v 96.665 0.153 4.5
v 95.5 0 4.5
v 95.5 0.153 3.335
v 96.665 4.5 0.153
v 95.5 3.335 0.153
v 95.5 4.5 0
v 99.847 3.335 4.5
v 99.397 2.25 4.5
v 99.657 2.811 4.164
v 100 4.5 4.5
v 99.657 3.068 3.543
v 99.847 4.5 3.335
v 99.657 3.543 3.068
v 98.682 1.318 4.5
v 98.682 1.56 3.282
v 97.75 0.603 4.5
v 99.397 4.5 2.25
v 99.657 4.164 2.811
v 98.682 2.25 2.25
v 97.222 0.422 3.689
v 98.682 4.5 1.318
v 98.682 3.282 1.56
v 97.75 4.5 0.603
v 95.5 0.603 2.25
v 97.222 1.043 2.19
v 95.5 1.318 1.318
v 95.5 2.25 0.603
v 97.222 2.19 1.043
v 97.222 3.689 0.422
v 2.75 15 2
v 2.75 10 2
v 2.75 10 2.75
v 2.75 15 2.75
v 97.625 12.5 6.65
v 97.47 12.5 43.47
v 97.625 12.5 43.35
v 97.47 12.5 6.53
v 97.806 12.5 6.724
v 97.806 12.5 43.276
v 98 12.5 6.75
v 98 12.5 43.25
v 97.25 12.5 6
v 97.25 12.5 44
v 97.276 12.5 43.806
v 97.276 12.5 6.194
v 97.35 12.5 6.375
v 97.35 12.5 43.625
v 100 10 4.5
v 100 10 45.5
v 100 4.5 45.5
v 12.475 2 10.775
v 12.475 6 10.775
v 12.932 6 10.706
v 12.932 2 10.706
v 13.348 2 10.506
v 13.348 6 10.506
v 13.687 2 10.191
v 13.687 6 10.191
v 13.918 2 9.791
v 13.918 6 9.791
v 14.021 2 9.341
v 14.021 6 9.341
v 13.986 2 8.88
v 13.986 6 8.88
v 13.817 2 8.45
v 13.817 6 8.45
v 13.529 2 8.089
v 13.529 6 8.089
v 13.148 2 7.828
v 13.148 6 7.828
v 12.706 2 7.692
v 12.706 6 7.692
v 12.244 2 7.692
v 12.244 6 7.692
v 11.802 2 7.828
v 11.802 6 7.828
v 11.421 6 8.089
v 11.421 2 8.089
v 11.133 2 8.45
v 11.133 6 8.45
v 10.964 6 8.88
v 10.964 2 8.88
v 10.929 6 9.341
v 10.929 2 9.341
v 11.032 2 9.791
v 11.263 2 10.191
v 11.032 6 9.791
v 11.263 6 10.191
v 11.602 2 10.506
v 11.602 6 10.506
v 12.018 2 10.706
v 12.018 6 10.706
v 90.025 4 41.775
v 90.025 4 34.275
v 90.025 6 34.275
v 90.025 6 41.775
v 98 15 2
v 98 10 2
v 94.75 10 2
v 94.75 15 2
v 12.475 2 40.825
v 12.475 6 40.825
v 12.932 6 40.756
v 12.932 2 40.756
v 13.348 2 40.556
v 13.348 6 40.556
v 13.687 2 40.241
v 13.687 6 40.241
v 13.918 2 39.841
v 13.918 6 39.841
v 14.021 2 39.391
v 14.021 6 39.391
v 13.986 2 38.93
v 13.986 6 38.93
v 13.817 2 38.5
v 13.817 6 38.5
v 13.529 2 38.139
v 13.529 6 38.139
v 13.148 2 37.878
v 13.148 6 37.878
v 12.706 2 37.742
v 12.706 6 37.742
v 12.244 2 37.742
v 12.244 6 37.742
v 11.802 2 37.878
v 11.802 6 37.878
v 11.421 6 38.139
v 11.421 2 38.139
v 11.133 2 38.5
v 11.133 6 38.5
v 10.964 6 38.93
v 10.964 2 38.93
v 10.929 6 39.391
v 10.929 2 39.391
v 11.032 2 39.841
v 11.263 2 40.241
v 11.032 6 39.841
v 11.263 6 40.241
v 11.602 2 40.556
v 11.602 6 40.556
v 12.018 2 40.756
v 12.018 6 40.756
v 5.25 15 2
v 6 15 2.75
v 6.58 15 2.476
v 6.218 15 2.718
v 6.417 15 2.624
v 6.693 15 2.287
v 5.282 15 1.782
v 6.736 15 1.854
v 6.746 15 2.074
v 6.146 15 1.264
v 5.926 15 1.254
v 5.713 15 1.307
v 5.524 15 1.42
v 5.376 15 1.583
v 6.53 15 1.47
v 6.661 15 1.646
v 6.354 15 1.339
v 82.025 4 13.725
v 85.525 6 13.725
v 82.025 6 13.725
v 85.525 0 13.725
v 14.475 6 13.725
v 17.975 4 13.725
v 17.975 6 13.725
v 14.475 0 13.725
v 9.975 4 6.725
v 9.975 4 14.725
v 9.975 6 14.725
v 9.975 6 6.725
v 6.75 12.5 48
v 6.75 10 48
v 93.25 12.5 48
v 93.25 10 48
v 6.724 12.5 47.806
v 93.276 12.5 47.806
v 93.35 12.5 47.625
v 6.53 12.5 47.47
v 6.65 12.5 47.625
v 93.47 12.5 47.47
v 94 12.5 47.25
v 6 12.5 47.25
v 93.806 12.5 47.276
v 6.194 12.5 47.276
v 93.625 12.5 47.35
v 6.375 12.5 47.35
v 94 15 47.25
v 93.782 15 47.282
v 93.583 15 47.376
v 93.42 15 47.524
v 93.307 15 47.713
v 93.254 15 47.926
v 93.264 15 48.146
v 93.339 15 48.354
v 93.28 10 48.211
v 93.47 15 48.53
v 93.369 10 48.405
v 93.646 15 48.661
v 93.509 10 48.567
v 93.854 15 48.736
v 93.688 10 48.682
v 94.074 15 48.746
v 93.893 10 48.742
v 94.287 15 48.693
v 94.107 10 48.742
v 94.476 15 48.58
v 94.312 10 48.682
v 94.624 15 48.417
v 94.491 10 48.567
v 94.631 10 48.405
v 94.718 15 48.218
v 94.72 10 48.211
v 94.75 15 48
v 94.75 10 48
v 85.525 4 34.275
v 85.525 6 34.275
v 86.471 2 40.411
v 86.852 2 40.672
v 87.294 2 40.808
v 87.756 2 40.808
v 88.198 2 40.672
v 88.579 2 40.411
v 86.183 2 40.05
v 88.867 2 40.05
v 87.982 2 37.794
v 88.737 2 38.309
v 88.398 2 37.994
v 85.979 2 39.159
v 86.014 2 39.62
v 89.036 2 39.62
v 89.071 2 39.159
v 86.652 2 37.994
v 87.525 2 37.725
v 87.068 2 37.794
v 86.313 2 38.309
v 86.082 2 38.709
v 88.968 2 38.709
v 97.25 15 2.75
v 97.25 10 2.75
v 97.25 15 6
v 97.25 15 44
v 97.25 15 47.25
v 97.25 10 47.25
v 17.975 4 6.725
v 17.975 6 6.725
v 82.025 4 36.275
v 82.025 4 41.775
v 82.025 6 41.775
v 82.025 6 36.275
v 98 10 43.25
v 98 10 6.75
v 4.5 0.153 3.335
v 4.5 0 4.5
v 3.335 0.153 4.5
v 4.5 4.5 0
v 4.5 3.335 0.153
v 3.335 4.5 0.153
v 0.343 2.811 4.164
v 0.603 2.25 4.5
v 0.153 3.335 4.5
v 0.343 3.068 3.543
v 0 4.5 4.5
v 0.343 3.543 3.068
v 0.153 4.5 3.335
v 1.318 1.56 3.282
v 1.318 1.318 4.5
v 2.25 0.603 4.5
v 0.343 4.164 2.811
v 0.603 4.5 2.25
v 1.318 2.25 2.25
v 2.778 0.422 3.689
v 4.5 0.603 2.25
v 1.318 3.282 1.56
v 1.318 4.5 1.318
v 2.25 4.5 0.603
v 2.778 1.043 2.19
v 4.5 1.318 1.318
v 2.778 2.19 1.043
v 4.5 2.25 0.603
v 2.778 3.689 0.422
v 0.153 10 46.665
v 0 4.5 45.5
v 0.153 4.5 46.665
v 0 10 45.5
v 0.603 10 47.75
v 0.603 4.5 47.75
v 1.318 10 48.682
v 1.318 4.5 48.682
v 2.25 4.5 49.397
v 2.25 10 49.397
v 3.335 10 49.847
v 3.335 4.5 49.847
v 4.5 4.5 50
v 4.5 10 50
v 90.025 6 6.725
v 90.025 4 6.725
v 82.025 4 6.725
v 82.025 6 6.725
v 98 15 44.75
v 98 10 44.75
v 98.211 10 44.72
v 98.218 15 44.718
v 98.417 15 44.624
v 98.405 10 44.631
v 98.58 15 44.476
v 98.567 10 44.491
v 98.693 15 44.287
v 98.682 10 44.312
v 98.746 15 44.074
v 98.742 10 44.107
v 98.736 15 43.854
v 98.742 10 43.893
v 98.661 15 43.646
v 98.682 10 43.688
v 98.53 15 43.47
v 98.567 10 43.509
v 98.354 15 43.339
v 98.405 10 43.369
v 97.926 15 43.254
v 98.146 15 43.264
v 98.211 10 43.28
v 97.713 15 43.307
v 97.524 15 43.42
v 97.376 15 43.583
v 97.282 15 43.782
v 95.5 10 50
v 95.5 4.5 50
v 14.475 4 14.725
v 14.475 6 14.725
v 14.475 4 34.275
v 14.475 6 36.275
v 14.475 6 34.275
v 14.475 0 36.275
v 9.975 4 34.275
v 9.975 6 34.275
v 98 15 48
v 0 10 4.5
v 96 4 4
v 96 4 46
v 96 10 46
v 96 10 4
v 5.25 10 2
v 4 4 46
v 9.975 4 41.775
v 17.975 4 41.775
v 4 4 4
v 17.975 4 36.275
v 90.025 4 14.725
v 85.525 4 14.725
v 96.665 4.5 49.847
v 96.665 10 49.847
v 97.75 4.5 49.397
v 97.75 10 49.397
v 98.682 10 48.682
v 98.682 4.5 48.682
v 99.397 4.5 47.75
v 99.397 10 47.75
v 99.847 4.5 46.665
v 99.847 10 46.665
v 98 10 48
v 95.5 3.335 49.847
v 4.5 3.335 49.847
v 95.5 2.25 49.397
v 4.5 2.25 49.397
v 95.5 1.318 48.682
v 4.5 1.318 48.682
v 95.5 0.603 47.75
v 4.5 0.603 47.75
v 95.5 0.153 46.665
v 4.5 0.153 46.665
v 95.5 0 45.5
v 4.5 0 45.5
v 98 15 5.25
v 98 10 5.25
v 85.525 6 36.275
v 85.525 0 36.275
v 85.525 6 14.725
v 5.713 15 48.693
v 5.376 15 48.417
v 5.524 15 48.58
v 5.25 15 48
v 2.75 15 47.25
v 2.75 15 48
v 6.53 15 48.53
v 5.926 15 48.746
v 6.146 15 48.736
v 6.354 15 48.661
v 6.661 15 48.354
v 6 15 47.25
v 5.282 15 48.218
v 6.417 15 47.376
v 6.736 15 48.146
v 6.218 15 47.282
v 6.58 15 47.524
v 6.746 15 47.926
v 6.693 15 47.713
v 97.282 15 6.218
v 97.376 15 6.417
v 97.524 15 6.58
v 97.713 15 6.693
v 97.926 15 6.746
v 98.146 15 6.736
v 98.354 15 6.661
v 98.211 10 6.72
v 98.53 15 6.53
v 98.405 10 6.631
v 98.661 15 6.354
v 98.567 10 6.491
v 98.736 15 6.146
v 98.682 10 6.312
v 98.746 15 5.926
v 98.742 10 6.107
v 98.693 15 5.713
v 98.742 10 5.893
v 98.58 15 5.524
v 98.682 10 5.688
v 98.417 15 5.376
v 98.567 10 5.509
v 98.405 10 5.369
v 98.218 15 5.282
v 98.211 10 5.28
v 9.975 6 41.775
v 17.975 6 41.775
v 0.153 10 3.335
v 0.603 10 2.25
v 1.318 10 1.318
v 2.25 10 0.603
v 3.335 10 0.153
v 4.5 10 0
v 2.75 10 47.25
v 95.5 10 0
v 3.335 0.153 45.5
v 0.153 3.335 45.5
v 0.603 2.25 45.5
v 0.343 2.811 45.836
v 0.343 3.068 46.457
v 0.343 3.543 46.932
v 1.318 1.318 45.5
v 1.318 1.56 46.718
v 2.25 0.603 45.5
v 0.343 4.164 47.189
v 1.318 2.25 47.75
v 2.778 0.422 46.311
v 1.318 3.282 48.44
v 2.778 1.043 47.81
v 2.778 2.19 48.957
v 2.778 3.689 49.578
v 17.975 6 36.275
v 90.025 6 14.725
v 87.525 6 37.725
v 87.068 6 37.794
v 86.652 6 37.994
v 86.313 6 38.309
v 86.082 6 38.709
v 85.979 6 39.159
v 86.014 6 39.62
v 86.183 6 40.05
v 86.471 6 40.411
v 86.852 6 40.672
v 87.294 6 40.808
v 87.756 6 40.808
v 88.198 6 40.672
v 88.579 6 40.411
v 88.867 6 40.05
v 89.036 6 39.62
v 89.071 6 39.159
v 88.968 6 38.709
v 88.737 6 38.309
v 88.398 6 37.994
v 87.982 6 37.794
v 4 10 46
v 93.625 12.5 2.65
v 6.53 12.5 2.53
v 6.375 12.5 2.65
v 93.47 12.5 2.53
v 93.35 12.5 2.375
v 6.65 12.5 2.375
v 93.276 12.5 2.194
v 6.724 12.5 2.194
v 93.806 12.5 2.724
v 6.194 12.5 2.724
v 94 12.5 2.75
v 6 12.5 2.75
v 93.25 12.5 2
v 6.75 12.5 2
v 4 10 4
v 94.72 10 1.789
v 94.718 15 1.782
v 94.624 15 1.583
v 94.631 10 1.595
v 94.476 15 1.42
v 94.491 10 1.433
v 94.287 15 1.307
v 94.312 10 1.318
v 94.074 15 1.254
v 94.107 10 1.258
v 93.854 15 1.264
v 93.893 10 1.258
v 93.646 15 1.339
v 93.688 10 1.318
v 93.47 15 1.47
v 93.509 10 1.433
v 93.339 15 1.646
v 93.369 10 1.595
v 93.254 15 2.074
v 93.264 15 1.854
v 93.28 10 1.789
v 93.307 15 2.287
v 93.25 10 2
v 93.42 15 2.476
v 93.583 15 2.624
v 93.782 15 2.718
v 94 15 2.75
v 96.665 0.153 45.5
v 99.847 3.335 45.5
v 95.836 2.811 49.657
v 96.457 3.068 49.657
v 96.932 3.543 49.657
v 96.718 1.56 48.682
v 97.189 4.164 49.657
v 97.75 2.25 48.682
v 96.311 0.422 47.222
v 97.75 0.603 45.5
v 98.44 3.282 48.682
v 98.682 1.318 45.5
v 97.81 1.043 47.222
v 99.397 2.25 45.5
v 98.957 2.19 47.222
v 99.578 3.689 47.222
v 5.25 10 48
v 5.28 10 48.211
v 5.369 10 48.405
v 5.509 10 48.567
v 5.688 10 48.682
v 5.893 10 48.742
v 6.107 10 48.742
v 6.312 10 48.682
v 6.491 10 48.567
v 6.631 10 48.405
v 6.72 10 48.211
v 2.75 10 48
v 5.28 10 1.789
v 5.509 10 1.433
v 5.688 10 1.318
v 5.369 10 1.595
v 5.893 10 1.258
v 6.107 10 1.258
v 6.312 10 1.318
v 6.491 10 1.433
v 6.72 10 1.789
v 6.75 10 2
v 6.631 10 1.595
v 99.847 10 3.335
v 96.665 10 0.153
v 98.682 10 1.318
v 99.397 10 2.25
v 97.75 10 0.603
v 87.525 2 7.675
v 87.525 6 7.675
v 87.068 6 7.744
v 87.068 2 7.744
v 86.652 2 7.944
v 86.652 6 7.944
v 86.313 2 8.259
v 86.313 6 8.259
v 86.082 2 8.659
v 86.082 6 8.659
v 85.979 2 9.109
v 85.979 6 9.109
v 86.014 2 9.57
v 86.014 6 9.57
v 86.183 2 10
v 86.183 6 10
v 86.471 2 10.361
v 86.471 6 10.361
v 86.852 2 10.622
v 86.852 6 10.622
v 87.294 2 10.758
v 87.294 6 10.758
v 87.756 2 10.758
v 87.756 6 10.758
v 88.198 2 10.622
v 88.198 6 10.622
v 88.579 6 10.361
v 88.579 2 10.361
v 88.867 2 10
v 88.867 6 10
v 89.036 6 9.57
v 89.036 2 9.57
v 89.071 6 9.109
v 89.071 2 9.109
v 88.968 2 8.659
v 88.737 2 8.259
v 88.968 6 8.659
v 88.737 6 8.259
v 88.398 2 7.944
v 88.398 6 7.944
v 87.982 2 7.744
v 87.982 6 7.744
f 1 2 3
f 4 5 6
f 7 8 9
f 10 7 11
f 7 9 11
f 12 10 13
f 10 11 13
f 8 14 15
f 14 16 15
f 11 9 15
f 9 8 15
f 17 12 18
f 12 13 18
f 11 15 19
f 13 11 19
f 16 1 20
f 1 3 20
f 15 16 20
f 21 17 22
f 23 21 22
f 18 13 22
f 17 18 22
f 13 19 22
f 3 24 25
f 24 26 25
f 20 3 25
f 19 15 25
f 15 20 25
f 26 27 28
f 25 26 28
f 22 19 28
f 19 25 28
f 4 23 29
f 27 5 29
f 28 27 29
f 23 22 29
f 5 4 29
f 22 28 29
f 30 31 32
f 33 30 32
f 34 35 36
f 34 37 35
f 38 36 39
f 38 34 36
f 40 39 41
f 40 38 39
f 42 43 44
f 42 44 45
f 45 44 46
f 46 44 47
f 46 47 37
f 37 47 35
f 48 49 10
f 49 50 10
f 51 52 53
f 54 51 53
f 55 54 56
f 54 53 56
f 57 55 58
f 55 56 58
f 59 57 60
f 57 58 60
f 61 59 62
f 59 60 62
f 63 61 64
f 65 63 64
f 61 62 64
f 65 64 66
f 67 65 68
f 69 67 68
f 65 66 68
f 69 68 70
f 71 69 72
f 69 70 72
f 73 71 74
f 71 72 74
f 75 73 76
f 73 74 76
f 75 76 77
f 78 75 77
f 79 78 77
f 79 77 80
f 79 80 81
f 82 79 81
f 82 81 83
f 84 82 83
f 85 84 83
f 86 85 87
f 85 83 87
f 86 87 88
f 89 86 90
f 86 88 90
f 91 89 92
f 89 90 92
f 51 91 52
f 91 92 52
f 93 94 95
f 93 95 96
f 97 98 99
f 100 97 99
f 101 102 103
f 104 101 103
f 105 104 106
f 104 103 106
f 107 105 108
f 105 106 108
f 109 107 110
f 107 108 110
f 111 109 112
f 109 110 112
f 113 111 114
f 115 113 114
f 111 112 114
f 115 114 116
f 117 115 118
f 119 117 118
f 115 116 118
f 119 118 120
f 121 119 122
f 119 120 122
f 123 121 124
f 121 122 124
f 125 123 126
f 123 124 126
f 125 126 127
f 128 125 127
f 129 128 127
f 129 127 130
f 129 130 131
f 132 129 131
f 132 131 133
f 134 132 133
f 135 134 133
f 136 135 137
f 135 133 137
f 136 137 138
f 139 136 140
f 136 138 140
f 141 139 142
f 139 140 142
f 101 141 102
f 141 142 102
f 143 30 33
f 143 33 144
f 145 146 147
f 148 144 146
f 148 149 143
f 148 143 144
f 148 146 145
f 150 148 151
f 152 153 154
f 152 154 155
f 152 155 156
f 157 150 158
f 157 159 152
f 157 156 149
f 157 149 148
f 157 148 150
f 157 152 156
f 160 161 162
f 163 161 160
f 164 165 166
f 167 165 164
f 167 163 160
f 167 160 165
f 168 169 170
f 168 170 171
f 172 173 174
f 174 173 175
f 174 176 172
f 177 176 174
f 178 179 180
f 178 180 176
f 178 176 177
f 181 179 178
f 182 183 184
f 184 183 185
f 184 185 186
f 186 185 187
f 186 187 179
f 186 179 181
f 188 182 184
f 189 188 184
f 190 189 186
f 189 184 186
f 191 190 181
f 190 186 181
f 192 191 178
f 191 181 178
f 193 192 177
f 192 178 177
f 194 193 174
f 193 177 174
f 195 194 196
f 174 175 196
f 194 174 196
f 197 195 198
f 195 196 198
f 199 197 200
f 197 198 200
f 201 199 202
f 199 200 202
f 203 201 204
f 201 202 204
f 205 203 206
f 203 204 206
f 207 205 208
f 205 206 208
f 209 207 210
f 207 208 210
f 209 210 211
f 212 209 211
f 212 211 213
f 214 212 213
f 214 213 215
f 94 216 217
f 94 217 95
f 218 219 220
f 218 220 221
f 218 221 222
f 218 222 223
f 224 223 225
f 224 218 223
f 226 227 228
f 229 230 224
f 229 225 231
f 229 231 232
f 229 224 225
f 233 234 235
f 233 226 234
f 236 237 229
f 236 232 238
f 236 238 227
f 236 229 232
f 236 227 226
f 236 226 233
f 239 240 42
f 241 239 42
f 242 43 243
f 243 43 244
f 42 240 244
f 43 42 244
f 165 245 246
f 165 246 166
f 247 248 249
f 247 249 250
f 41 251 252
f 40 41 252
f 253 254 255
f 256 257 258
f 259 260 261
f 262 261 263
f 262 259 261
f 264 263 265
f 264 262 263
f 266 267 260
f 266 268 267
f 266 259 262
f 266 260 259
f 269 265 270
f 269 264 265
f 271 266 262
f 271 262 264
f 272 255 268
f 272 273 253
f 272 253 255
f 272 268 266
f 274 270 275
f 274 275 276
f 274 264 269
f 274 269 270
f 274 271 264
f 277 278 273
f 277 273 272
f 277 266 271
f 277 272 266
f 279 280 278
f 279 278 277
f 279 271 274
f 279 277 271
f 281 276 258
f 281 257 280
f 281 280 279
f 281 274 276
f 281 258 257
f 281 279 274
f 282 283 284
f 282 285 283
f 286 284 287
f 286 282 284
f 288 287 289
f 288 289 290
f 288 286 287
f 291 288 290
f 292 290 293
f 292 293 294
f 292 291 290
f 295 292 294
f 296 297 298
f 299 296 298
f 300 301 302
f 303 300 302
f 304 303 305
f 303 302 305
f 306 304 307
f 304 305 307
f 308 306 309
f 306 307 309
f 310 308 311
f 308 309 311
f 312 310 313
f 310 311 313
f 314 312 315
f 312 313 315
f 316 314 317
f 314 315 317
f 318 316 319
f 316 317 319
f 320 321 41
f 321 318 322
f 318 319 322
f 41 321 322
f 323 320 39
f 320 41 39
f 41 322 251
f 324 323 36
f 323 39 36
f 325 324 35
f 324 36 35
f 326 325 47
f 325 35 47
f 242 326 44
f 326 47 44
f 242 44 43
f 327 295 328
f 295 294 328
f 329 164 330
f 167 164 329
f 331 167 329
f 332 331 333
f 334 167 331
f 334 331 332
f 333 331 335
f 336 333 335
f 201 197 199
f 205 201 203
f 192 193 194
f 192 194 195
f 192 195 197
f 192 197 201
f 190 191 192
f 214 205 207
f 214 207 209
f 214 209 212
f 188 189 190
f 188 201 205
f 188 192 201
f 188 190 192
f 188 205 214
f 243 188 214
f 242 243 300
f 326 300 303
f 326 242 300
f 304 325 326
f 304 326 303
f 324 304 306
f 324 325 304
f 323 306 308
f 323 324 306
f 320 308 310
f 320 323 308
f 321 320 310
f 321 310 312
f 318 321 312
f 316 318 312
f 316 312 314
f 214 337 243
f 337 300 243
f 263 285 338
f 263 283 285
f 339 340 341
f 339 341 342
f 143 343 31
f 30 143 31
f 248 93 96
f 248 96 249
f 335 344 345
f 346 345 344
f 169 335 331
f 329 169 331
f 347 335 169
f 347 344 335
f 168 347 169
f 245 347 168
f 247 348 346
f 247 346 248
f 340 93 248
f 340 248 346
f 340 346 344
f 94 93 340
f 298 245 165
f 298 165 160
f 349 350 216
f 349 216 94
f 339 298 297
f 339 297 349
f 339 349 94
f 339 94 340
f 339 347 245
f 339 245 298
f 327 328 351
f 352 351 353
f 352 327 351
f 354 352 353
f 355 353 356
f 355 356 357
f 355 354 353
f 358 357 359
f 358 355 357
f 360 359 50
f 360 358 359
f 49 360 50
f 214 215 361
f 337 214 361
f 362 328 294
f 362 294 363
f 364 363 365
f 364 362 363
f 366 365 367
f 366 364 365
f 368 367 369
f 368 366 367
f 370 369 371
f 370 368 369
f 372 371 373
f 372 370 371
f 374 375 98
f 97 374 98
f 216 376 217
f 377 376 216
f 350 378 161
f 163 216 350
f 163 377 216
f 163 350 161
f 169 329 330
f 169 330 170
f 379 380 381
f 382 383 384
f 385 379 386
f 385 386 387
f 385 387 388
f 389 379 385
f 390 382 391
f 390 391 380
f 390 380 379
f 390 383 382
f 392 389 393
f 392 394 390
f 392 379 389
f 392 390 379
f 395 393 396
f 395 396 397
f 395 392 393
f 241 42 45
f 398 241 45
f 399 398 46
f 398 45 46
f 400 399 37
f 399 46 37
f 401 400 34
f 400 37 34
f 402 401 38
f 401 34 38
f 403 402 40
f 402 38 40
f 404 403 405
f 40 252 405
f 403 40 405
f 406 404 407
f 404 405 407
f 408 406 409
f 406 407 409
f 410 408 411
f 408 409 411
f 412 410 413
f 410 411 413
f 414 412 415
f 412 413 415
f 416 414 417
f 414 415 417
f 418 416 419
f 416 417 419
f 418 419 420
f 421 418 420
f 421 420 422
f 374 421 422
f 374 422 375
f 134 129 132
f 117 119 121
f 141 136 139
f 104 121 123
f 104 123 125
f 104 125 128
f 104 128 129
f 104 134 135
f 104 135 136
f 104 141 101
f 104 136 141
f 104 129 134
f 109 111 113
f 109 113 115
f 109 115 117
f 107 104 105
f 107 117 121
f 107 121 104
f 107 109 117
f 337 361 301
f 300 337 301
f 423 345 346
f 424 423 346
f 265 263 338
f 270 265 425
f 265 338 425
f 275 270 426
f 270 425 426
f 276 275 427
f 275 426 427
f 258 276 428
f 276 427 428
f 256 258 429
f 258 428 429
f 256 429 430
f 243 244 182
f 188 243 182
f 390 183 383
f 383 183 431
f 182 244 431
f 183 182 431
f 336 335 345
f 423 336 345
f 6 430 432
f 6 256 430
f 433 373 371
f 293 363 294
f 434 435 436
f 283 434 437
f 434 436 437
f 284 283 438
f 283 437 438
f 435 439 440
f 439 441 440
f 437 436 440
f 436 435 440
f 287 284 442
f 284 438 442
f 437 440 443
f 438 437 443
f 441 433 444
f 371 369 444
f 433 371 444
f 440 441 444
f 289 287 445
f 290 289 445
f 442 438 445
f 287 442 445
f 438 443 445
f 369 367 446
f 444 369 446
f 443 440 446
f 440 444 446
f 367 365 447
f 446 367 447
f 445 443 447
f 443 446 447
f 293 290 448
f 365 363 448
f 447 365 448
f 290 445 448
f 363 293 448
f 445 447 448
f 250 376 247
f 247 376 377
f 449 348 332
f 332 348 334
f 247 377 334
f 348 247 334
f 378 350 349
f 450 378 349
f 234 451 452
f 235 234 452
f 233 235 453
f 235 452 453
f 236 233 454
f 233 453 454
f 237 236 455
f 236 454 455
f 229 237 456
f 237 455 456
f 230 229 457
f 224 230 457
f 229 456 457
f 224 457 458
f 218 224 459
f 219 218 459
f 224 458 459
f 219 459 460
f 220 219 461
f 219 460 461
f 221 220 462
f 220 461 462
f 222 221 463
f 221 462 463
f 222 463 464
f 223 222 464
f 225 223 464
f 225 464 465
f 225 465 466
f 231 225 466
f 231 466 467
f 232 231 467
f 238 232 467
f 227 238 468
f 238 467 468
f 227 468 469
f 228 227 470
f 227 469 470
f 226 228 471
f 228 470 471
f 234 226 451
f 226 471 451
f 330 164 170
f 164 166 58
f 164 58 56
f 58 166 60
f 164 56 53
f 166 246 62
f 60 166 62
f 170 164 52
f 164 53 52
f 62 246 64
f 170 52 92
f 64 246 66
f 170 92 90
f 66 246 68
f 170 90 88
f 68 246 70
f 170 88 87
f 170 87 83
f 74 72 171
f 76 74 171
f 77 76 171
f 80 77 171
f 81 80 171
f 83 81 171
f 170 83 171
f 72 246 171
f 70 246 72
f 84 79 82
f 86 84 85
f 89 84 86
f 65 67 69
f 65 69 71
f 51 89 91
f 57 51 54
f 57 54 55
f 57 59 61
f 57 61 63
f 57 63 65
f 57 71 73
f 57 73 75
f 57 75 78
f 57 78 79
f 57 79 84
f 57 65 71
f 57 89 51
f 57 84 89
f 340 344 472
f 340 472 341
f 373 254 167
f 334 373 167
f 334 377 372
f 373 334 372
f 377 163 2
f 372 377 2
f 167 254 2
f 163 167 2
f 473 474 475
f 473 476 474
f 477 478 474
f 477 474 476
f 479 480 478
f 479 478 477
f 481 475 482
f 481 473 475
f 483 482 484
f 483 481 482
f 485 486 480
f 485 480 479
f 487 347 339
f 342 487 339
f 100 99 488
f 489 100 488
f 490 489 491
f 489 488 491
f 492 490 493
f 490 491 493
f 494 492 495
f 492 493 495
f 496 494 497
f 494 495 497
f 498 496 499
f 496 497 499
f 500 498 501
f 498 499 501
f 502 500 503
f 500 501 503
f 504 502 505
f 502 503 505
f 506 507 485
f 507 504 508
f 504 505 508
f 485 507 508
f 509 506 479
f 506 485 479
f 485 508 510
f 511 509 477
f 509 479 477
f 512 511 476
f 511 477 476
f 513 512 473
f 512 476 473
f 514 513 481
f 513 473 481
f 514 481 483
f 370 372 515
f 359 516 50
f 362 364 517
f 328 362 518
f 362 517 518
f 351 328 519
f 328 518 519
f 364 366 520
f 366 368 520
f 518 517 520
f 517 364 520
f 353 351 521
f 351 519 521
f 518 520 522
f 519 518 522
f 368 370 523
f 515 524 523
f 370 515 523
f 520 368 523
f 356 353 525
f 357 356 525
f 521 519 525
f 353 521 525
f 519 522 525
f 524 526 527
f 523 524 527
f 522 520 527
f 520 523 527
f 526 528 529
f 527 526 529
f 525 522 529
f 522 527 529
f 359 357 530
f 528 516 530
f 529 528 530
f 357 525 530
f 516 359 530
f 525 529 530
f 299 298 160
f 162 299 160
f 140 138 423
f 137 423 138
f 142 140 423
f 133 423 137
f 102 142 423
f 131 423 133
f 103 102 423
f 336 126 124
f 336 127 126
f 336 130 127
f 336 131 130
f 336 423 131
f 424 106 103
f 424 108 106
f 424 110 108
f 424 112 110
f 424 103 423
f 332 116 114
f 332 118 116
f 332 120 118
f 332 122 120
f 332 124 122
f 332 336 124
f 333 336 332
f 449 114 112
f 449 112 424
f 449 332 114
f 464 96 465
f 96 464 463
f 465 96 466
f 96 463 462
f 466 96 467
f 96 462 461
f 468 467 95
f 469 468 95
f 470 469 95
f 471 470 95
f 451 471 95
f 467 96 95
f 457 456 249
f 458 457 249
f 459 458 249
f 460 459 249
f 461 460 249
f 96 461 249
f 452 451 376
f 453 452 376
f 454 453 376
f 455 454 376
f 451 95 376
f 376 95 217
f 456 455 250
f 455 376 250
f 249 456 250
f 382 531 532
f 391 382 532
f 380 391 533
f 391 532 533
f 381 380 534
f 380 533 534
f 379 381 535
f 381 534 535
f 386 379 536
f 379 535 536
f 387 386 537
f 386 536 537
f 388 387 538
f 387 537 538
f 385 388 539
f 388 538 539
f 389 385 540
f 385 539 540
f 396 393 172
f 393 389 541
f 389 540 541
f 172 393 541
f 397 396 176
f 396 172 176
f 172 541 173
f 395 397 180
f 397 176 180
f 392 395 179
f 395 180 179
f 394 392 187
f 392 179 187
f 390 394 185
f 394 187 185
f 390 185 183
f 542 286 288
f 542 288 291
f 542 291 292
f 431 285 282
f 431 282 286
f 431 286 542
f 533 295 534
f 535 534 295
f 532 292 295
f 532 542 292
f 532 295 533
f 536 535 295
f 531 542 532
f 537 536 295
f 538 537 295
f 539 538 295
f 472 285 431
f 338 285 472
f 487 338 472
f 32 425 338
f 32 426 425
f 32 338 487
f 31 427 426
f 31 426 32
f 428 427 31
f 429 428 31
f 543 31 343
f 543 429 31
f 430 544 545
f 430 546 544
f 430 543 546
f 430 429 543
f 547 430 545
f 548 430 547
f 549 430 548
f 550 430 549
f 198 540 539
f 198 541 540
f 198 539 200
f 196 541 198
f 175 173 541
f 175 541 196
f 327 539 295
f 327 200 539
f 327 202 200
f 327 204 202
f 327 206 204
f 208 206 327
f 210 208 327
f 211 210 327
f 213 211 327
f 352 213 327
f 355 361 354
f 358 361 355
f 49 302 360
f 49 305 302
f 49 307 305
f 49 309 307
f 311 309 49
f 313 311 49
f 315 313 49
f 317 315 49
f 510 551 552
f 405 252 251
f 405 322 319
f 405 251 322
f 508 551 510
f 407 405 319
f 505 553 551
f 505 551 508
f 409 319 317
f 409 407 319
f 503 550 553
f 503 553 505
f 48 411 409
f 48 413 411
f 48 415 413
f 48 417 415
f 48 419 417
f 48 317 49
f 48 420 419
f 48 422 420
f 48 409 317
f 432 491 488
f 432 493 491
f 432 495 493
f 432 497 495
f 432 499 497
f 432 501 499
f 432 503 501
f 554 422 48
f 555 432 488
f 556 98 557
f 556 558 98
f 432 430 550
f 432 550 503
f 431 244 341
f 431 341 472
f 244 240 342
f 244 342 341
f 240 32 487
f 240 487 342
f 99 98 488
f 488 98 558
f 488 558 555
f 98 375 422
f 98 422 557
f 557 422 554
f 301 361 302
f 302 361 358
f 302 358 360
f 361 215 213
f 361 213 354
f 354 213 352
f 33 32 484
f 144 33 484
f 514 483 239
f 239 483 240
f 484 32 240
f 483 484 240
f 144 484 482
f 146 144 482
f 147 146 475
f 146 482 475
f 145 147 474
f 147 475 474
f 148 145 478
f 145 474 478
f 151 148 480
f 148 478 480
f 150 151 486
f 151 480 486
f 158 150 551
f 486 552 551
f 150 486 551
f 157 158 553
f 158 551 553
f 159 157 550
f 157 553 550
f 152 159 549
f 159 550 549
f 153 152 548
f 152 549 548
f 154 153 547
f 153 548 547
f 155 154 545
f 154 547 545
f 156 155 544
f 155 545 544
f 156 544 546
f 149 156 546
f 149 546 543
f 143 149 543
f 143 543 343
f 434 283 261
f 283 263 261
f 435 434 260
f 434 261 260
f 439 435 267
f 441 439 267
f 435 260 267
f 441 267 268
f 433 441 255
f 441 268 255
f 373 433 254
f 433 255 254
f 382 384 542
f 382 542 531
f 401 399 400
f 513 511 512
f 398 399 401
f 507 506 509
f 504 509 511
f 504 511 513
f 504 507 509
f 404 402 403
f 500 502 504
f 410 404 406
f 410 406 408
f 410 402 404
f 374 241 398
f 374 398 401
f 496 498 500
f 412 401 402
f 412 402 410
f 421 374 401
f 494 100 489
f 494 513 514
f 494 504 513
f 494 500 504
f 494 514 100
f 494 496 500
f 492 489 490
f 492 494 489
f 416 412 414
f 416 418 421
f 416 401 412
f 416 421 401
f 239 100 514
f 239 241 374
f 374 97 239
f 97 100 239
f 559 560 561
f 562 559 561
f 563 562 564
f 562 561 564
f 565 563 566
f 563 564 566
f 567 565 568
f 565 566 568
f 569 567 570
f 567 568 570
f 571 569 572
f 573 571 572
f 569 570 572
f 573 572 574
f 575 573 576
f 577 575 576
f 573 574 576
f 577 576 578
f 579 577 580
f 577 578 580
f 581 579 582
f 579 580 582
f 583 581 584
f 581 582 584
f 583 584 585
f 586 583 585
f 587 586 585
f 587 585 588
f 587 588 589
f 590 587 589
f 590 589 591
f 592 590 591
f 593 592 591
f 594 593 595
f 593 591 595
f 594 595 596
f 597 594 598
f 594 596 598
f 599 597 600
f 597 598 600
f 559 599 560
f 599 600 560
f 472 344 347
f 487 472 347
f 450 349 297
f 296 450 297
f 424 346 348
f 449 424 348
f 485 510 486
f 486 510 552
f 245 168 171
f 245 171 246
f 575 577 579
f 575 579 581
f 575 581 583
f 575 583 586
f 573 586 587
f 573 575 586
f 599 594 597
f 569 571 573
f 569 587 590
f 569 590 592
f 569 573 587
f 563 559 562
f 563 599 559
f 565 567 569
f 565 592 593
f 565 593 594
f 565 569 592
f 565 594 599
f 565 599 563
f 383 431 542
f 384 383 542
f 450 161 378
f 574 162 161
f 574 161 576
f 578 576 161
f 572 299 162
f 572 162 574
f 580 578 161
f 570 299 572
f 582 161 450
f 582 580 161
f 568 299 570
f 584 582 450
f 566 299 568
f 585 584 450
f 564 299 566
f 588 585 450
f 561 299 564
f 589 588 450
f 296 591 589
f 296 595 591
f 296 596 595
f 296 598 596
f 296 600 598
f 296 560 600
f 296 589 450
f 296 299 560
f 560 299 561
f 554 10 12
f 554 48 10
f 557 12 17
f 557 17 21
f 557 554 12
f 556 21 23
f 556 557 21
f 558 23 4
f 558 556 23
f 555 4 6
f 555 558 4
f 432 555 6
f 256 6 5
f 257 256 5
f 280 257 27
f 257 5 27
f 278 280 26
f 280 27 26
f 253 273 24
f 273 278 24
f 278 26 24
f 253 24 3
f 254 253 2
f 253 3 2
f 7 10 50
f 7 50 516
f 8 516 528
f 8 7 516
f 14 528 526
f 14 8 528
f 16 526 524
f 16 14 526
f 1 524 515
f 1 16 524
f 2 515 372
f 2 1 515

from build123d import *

# Parameters (mm, degrees)
SKETCH_1_W          = 100
SKETCH_1_H          = 50
EXTRUDE_1_DEPTH     = 10
SHELL_1_T           = -4
FILLET_1_R          = 4.5
SKETCH_2_W          = 71.05
SKETCH_2_H          = 22.55
CUT_EXTRUDE_1_DEPTH = 4.5
EXTRUDE_3_DEPTH     = 2
SKETCH_7_R          = 1.55
CUT_EXTRUDE_2_DEPTH = 4
EXTRUDE_5_DEPTH     = 5
EXTRUDE_6_DEPTH     = 2.5


with BuildPart() as part:
    # Эскиз1 → Бобышка-Вытянуть1 (new body)
    with BuildSketch(Plane(origin=(0, 0, 0), x_dir=(1, 0, 0), z_dir=(0, 1, 0))):
        with Locations((50, -25)):
            Rectangle(SKETCH_1_W, SKETCH_1_H)
    extrude(amount=EXTRUDE_1_DEPTH)

    # Оболочка1
    shell_1_openings = [part.faces().sort_by_distance(p)[0] for p in [
        (50, 10, 25),
    ]]
    offset(amount=SHELL_1_T, openings=shell_1_openings, kind=Kind.INTERSECTION)

    # Скругление1
    fillet_1_edges = [part.edges().sort_by_distance(p)[0] for p in [
        (50, 0, 50),
        (100, 0, 25),
        (50, 0, 0),
        (0, 0, 25),
        (100, 5, 0),
        (100, 5, 50),
        (0, 5, 0),
        (0, 5, 50),
    ]]
    fillet(fillet_1_edges, radius=FILLET_1_R)

    # Эскиз2 → Вырез-Вытянуть1 (cut)
    with BuildSketch(Plane(origin=(0, 0, 0), x_dir=(-1, 0, 0), z_dir=(0, -1, 0))):
        with Locations((-50, -25)):
            Rectangle(SKETCH_2_W, SKETCH_2_H)
    extrude(amount=-CUT_EXTRUDE_1_DEPTH, mode=Mode.SUBTRACT)

    # Эскиз6 → Бобышка-Вытянуть3 (add)
    with BuildSketch(Plane(origin=(0, 4, 0), x_dir=(1, 0, 0), z_dir=(0, 1, 0))):
        Polygon((14.475, -13.725), (14.475, -14.725), (9.975, -14.725), (9.975, -6.725), (17.975, -6.725), (17.975, -13.725), align=None)
        Polygon((14.475, -36.275), (14.475, -34.275), (9.975, -34.275), (9.975, -41.775), (17.975, -41.775), (17.975, -36.275), align=None)
        Polygon((90.025, -41.775), (82.025, -41.775), (82.025, -36.275), (85.525, -36.275), (85.525, -34.275), (90.025, -34.275), align=None)
        Polygon((82.025, -6.725), (82.025, -13.725), (85.525, -13.725), (85.525, -14.725), (90.025, -14.725), (90.025, -6.725), align=None)
    extrude(amount=EXTRUDE_3_DEPTH)

    # Эскиз7 → Вырез-Вытянуть2 (cut)
    with BuildSketch(Plane(origin=(0, 6, 0), x_dir=(1, 0, 0), z_dir=(0, 1, 0))):
        with Locations((12.475, -9.225)):
            Circle(SKETCH_7_R)
        with Locations((87.525, -9.225)):
            Circle(SKETCH_7_R)
        with Locations((12.475, -39.275)):
            Circle(SKETCH_7_R)
        with Locations((87.525, -39.275)):
            Circle(SKETCH_7_R)
    extrude(amount=-CUT_EXTRUDE_2_DEPTH, mode=Mode.SUBTRACT)

    # Эскиз8 → Бобышка-Вытянуть5 (add)
    with BuildSketch(Plane(origin=(0, 10, 0), x_dir=(1, 0, 0), z_dir=(0, 1, 0))):
        with BuildLine():
            Line((5.25, -2), (2.75, -2))
            Line((2.75, -2), (2.75, -2.75))
            Line((2.75, -2.75), (6, -2.75))
            ThreePointArc((6, -2.75), (6.530330086, -1.469669914), (5.25, -2))
        make_face()
        with BuildLine():
            Line((6, -47.25), (2.75, -47.25))
            Line((2.75, -47.25), (2.75, -48))
            Line((2.75, -48), (5.25, -48))
            ThreePointArc((5.25, -48), (6.530330086, -48.530330086), (6, -47.25))
        make_face()
        with BuildLine():
            Line((98, -2), (94.75, -2))
            ThreePointArc((94.75, -2), (93.469669914, -1.469669914), (94, -2.75))
            Line((94, -2.75), (97.25, -2.75))
            Line((97.25, -2.75), (97.25, -6))
            ThreePointArc((97.25, -6), (98.530330086, -6.530330086), (98, -5.25))
            Line((98, -5.25), (98, -2))
        make_face()
        with BuildLine():
            Line((97.25, -47.25), (94, -47.25))
            ThreePointArc((94, -47.25), (93.469669914, -48.530330086), (94.75, -48))
            Line((94.75, -48), (98, -48))
            Line((98, -48), (98, -44.75))
            ThreePointArc((98, -44.75), (98.530330086, -43.469669914), (97.25, -44))
            Line((97.25, -44), (97.25, -47.25))
        make_face()
    extrude(amount=EXTRUDE_5_DEPTH)

    # Эскиз8<4> → Бобышка-Вытянуть6 (add)
    with BuildSketch(Plane(origin=(0, 10, 0), x_dir=(1, 0, 0), z_dir=(0, 1, 0))):
        with BuildLine():
            ThreePointArc((6.75, -2), (6.530330086, -2.530330086), (6, -2.75))
            Line((6, -2.75), (94, -2.75))
            ThreePointArc((94, -2.75), (93.469669914, -2.530330086), (93.25, -2))
            Line((93.25, -2), (6.75, -2))
        make_face()
        with BuildLine():
            Line((94, -47.25), (6, -47.25))
            ThreePointArc((6, -47.25), (6.530330086, -47.469669914), (6.75, -48))
            Line((6.75, -48), (93.25, -48))
            ThreePointArc((93.25, -48), (93.469669914, -47.469669914), (94, -47.25))
        make_face()
        with BuildLine():
            ThreePointArc((98, -6.75), (97.469669914, -6.530330086), (97.25, -6))
            Line((97.25, -6), (97.25, -44))
            ThreePointArc((97.25, -44), (97.469669914, -43.469669914), (98, -43.25))
            Line((98, -43.25), (98, -6.75))
        make_face()
    extrude(amount=EXTRUDE_6_DEPTH)


solid = part.part
